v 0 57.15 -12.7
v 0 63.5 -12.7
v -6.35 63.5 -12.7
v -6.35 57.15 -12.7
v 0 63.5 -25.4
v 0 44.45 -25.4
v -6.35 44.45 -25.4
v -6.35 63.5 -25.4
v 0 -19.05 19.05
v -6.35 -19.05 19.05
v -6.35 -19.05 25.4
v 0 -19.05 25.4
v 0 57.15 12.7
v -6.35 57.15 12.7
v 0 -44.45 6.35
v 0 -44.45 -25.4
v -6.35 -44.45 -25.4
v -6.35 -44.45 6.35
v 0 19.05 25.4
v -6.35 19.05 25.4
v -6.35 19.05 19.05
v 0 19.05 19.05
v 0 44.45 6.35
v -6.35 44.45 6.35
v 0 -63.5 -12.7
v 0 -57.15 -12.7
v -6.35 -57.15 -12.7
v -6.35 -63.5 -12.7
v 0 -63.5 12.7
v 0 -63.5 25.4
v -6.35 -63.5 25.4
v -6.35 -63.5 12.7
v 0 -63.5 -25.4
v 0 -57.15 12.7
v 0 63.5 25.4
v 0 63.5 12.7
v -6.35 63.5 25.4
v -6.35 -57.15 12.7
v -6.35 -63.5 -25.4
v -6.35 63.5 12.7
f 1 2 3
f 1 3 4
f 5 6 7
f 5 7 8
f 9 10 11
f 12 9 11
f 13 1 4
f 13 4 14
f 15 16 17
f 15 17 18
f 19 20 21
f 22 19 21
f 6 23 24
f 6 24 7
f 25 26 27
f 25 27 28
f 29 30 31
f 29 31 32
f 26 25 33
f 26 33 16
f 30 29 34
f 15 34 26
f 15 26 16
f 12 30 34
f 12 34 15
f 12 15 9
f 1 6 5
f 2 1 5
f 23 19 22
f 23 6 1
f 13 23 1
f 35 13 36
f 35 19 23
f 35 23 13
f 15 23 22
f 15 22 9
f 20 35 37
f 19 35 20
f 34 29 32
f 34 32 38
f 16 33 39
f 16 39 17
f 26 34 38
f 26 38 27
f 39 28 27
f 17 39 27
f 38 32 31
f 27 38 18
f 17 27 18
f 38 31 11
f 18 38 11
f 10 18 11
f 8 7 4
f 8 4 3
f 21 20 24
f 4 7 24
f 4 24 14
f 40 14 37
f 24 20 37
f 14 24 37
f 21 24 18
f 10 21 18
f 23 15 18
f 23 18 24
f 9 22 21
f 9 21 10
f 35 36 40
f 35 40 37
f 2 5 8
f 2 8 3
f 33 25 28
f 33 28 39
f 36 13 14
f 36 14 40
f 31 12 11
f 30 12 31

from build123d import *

# Parameters (mm, degrees)
F1_DEPTH = 6.35


with BuildPart() as f1:
    # F0 (on Right) → F1 (new body)
    with BuildSketch(Plane.YZ):
        Polygon((63.5, 25.4), (57.15, 25.4), (50.8, 25.4), (44.45, 25.4), (38.1, 25.4), (31.75, 25.4), (25.4, 25.4), (19.05, 25.4), (19.05, 19.05), (12.7, 19.05), (6.35, 19.05), (0, 19.05), (-6.35, 19.05), (-12.7, 19.05), (-19.05, 19.05), (-19.05, 25.4), (-25.4, 25.4), (-31.75, 25.4), (-38.1, 25.4), (-44.45, 25.4), (-50.8, 25.4), (-63.5, 25.4), (-63.5, 12.7), (-57.15, 12.7), (-57.15, 6.35), (-57.15, 0), (-57.15, -6.35), (-57.15, -12.7), (-63.5, -12.7), (-63.5, -19.05), (-63.5, -25.4), (-50.8, -25.4), (-44.45, -25.4), (-44.45, 6.35), (44.45, 6.35), (44.45, -25.4), (50.8, -25.4), (63.5, -25.4), (63.5, -19.05), (63.5, -12.7), (57.15, -12.7), (57.15, -6.35), (57.15, 0), (57.15, 6.35), (57.15, 12.7), (63.5, 12.7), align=None)
    extrude(amount=-F1_DEPTH)


solid = f1.part
